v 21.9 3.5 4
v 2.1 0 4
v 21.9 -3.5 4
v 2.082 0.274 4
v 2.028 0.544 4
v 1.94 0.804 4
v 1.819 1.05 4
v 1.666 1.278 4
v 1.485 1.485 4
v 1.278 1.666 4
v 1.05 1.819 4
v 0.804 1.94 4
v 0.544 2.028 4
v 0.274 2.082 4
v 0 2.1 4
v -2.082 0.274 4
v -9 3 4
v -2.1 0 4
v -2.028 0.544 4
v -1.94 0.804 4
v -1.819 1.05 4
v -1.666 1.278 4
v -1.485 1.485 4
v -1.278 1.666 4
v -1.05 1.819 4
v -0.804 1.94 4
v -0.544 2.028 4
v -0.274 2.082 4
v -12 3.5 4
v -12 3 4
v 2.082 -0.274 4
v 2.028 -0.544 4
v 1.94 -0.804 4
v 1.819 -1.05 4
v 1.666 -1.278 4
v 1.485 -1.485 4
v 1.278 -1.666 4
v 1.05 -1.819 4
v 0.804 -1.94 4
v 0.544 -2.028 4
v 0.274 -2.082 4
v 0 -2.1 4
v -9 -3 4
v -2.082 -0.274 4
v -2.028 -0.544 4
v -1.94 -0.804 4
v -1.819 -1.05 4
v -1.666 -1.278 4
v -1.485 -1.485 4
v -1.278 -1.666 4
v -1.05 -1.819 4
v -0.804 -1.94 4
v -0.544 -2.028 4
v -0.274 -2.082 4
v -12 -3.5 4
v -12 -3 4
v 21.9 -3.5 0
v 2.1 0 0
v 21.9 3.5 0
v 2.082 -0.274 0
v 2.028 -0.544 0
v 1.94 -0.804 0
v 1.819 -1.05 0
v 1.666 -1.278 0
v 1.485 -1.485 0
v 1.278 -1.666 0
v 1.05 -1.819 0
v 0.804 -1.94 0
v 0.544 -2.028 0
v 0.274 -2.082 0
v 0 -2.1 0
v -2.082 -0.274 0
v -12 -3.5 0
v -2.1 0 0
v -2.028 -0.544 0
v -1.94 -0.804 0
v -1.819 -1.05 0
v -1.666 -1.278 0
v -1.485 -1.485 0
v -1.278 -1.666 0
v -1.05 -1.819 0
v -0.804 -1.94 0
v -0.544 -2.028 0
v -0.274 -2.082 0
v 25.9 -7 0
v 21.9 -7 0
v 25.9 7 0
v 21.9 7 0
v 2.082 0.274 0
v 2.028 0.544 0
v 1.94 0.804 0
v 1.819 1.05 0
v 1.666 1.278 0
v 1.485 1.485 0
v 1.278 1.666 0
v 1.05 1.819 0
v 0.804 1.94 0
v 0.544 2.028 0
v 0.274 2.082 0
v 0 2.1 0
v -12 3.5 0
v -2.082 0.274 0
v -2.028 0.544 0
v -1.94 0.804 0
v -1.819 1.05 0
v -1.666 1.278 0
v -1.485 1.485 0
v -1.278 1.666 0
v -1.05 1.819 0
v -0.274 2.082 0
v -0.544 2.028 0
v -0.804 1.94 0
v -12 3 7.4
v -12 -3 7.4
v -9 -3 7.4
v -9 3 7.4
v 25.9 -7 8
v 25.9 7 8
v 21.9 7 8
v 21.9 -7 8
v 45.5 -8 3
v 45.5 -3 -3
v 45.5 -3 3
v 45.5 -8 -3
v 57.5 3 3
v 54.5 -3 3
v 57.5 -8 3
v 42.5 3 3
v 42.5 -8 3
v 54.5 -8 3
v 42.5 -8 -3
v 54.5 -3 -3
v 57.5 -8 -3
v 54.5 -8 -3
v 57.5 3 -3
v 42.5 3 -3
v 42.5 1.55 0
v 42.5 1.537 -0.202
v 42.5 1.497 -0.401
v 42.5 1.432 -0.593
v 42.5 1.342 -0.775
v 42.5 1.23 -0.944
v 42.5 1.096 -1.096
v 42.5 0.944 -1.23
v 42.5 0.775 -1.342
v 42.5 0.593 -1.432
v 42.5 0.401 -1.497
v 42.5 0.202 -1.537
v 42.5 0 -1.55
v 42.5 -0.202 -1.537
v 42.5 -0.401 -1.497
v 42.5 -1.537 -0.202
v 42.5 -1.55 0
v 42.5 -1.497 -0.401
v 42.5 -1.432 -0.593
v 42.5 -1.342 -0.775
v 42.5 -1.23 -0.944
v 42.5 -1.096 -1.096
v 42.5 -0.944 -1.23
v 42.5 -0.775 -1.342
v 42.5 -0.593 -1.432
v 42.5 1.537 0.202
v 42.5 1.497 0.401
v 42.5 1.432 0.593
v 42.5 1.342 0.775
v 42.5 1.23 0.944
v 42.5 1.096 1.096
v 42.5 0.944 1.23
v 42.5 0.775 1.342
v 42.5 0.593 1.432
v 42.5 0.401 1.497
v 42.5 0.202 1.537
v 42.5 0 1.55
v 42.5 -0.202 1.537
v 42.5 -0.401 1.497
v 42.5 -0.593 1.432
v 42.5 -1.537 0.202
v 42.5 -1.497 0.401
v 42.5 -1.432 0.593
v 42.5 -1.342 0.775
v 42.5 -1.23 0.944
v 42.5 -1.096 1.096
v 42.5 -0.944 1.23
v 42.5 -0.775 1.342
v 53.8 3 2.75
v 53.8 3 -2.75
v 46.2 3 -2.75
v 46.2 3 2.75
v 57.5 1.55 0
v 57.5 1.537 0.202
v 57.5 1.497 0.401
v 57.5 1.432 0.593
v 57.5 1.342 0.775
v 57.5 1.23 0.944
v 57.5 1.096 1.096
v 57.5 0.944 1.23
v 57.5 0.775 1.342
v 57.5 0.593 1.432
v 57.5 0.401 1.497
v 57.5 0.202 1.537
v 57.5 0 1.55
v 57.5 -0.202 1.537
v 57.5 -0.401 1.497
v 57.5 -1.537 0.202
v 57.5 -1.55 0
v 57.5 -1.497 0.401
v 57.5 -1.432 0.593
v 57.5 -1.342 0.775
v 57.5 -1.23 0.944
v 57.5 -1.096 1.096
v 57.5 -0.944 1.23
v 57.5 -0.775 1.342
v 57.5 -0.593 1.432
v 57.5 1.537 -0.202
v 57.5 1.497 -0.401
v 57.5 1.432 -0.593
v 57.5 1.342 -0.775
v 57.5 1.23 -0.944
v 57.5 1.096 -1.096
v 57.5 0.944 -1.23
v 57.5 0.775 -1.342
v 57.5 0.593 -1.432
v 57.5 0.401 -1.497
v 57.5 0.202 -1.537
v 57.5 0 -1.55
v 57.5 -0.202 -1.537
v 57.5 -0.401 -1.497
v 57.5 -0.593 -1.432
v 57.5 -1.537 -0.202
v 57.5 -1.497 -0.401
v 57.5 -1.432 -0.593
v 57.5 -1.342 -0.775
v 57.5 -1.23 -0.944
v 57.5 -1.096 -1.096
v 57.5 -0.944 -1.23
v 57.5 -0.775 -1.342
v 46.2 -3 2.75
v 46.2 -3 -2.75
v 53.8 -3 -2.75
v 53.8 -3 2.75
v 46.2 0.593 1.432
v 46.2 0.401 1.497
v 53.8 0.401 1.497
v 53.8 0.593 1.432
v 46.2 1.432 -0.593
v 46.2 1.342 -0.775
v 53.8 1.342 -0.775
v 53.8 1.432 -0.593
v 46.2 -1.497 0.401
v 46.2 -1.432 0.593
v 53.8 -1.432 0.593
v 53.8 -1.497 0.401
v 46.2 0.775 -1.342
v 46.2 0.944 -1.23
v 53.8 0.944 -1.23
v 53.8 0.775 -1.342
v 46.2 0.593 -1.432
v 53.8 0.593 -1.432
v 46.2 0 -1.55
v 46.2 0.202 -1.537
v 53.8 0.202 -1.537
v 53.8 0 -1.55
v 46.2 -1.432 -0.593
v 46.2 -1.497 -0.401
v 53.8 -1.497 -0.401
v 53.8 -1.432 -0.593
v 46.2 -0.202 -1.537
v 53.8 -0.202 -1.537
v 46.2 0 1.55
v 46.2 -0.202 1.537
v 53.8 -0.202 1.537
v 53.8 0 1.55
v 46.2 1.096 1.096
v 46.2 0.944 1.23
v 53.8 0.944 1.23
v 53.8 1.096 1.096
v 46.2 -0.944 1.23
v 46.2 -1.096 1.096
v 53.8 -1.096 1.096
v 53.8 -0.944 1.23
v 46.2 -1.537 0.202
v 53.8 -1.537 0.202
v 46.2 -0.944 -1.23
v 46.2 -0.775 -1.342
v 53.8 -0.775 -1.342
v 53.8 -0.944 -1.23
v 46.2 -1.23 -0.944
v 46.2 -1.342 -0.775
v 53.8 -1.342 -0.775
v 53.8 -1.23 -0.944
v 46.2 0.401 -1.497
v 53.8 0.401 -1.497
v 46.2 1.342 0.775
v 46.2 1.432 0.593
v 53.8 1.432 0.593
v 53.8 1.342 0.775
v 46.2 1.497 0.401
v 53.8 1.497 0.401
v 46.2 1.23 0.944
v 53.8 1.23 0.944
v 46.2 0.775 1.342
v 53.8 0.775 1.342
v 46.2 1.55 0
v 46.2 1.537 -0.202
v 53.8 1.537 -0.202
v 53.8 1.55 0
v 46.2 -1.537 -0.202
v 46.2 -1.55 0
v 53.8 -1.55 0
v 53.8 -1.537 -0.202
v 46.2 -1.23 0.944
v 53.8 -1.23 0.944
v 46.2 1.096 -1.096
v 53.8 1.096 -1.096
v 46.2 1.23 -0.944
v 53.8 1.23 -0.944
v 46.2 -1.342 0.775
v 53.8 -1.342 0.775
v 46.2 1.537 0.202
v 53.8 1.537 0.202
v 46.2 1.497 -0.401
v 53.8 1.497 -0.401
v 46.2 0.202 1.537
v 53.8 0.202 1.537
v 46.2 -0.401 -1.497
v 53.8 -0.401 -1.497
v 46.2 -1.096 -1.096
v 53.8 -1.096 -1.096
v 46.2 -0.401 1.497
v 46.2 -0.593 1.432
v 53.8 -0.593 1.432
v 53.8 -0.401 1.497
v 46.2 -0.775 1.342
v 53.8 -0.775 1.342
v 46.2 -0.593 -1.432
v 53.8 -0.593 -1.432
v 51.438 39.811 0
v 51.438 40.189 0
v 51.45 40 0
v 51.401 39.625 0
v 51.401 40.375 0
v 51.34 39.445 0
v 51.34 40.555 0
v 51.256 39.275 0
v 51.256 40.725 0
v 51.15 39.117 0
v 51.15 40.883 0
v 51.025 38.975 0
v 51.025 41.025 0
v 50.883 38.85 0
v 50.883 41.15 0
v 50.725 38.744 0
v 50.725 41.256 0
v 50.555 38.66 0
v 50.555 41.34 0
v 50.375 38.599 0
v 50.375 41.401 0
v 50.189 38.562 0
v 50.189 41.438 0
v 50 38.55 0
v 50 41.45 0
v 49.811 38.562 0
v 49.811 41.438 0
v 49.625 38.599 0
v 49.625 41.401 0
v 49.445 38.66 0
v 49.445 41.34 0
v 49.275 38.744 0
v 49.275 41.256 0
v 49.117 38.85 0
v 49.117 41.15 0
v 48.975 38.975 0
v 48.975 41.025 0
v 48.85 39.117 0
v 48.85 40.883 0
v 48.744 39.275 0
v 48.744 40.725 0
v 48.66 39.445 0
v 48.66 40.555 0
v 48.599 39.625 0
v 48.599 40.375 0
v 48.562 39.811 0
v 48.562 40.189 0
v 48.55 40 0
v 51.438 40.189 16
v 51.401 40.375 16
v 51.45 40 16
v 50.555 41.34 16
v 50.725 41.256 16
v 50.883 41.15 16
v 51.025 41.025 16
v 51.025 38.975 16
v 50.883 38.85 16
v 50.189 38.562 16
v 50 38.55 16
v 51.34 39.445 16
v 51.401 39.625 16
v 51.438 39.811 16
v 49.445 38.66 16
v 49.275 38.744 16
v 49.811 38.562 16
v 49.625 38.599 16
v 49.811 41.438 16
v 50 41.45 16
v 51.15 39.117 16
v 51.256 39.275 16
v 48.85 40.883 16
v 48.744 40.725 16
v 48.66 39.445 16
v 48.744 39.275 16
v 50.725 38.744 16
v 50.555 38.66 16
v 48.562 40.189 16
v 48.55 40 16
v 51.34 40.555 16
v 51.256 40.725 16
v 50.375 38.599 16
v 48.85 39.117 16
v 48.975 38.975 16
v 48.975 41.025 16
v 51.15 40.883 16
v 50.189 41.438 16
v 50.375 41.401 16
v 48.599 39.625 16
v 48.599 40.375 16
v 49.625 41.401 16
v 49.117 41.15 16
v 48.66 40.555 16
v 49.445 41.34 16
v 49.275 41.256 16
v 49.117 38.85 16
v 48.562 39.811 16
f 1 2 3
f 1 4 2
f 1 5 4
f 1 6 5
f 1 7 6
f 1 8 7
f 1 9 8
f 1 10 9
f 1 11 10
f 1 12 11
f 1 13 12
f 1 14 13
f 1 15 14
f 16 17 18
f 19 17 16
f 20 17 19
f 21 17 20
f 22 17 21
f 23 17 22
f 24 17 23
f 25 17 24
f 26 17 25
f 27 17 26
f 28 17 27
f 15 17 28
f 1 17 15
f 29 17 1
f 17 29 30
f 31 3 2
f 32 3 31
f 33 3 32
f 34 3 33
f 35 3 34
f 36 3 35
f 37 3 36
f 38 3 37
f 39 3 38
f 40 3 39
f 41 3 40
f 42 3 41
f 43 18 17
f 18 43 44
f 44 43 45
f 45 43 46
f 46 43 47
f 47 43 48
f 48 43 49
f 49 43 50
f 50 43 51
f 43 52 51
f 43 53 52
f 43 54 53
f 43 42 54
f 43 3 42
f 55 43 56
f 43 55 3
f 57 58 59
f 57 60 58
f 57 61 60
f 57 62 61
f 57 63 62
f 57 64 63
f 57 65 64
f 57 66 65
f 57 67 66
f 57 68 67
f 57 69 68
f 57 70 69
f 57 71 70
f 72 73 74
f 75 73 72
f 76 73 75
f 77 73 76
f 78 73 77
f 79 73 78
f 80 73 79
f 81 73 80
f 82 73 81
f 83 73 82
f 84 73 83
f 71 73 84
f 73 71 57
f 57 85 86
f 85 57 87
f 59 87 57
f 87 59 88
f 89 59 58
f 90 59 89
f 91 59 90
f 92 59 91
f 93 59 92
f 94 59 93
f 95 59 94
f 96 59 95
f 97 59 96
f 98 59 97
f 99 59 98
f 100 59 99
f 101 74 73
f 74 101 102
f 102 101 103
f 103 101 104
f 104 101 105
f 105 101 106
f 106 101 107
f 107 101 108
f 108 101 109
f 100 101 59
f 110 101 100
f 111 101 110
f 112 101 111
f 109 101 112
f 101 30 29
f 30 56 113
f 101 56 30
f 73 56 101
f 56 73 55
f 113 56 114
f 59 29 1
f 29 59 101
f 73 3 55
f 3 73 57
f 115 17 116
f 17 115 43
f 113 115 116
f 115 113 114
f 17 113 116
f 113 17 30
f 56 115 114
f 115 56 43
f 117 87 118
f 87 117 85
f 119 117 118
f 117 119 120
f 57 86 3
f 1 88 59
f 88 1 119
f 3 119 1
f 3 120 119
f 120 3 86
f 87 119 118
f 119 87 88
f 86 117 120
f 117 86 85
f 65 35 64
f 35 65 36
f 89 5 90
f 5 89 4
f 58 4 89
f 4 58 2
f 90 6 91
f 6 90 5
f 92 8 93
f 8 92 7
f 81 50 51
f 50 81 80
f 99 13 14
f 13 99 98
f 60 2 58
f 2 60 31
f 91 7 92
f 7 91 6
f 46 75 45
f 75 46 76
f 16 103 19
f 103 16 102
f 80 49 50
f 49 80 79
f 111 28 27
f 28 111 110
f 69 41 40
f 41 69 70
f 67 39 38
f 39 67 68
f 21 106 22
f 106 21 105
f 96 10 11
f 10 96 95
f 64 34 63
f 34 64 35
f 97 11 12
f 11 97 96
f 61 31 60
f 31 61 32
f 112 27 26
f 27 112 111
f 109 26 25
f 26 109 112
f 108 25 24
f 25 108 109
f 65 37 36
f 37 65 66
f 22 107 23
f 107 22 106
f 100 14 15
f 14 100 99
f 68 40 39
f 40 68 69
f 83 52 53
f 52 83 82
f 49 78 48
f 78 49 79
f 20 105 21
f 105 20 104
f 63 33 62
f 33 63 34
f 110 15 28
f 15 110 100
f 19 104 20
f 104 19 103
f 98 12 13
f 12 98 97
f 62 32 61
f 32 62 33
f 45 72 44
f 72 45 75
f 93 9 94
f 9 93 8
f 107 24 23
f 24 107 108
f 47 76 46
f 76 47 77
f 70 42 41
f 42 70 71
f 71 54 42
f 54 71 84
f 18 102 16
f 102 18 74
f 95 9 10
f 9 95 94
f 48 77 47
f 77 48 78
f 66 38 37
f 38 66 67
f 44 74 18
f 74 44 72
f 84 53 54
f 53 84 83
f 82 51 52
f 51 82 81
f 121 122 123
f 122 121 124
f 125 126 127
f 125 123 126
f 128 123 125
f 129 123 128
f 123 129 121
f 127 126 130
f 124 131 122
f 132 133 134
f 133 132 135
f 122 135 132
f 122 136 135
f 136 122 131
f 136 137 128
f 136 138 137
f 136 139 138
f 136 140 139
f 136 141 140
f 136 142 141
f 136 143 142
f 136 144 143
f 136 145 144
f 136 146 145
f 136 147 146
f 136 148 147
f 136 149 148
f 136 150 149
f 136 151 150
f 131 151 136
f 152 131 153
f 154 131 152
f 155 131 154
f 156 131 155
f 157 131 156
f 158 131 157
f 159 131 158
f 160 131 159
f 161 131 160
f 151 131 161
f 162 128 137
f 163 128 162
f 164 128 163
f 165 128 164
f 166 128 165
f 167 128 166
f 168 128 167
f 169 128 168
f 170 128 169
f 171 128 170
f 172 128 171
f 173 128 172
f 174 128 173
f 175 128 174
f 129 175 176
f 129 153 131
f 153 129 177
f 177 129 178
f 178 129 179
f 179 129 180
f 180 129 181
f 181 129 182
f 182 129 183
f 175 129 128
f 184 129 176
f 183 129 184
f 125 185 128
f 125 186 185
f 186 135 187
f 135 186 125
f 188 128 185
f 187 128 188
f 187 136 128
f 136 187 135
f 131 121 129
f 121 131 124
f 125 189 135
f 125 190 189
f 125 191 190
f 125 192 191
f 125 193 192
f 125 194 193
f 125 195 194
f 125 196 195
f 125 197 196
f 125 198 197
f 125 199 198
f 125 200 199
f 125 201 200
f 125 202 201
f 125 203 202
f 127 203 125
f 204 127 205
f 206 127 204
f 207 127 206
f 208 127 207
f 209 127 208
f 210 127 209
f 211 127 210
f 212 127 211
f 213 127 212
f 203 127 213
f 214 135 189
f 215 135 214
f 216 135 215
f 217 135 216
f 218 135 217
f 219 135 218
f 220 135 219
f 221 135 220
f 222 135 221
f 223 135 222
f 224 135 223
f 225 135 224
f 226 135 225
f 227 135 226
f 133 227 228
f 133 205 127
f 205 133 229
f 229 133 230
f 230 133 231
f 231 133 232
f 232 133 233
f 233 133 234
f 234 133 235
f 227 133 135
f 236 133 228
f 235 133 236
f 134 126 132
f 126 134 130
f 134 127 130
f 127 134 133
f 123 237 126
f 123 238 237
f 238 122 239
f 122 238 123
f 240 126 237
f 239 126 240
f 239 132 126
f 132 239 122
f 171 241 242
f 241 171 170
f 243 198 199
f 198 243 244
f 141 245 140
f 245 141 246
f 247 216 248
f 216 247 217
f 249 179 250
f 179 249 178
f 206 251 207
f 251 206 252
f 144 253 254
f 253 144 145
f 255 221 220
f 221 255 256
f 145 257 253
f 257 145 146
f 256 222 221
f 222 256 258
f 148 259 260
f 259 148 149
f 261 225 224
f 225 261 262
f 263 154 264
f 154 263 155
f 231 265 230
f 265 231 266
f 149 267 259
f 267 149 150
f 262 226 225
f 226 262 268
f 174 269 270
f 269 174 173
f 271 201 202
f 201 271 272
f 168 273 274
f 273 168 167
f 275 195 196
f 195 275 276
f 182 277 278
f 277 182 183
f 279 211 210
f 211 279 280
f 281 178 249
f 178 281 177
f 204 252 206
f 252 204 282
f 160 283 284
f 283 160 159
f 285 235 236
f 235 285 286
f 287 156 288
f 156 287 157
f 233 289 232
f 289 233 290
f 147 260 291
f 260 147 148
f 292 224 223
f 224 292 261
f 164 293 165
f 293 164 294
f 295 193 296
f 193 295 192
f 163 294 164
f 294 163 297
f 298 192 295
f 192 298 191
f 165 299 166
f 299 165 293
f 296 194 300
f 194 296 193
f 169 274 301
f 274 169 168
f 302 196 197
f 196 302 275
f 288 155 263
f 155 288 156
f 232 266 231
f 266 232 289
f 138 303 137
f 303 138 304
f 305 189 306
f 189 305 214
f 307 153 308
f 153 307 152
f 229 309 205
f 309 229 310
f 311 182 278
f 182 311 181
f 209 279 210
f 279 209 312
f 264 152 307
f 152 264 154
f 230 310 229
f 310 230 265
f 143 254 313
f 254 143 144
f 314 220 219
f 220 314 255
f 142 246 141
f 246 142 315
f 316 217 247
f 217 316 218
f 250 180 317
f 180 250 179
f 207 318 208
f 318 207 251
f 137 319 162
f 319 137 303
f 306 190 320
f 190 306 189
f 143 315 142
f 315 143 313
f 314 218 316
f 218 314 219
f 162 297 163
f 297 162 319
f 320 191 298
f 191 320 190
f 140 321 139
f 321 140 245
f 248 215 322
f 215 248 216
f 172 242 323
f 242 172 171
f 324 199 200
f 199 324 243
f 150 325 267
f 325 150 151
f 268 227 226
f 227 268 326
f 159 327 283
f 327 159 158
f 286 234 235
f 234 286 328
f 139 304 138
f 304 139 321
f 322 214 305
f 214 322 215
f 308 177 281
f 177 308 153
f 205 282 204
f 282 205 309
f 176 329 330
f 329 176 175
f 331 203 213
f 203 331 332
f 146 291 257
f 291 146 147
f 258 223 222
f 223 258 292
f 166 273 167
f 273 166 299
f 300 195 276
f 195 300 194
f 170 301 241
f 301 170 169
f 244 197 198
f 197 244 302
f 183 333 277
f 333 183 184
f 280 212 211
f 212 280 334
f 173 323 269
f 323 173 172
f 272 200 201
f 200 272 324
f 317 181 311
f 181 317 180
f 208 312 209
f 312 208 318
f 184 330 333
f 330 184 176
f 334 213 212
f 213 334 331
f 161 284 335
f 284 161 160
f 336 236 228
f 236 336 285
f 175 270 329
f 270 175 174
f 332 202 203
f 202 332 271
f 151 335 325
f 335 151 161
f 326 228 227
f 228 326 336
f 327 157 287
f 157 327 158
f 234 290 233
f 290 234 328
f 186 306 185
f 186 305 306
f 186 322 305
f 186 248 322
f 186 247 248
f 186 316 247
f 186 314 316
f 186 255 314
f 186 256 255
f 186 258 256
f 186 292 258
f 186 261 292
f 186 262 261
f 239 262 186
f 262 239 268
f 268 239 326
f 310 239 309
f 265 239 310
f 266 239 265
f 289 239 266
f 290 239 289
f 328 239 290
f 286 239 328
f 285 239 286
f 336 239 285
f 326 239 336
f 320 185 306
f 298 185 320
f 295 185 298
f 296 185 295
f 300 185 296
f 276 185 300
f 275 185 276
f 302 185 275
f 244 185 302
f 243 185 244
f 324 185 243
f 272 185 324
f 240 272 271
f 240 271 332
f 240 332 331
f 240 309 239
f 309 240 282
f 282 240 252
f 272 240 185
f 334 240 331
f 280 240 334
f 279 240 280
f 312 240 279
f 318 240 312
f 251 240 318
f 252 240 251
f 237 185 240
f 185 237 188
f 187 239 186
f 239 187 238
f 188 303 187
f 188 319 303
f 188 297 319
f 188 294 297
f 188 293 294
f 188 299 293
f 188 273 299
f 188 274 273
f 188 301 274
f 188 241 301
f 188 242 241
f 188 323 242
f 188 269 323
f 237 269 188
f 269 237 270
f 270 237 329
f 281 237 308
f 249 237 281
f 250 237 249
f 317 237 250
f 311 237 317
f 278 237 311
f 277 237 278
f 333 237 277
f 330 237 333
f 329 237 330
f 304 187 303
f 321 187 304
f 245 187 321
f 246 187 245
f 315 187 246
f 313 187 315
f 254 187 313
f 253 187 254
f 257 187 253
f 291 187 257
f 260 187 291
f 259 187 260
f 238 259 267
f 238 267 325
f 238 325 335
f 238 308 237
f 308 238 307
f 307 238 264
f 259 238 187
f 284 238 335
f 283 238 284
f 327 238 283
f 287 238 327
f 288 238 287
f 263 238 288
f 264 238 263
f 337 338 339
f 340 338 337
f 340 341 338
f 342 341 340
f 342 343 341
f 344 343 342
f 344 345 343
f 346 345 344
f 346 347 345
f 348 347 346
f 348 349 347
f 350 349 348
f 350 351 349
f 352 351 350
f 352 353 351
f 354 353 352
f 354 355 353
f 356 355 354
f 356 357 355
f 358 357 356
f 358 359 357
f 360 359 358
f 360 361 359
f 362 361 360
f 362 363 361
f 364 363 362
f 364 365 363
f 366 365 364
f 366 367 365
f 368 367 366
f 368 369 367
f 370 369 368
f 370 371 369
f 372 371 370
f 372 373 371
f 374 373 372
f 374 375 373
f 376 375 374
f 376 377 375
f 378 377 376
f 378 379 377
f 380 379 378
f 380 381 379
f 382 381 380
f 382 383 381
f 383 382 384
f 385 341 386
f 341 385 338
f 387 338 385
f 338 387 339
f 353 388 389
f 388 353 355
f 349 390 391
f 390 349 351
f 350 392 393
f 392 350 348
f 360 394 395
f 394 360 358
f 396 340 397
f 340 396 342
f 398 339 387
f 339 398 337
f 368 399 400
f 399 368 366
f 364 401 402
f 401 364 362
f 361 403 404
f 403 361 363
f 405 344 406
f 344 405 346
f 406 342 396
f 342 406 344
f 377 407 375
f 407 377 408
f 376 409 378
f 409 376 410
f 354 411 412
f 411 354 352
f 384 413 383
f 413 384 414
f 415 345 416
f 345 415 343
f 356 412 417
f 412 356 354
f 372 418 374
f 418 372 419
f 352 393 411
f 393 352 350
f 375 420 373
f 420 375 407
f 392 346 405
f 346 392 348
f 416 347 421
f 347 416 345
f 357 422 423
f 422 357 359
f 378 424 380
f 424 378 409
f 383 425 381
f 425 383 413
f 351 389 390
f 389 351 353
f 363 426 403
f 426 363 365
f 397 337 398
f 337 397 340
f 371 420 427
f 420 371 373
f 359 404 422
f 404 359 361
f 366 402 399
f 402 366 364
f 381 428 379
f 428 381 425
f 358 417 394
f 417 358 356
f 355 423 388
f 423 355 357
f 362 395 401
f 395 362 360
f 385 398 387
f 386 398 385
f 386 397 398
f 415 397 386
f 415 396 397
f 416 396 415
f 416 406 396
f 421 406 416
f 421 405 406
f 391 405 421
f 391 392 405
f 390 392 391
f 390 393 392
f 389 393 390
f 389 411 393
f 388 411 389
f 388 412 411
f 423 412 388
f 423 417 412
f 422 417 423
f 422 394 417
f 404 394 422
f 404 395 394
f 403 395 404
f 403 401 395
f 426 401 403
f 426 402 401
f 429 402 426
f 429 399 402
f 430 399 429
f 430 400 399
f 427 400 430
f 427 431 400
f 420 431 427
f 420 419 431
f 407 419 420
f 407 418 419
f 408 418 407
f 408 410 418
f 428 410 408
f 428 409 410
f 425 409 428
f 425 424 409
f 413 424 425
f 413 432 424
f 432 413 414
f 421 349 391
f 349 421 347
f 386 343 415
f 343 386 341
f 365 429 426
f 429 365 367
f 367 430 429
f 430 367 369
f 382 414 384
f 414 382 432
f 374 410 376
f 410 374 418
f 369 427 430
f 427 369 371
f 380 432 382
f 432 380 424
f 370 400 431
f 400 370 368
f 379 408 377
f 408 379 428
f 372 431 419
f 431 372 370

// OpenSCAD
// ═══════════════════════════════════════════════════════════════════════
//  CowPad — Manual Trigger Lever  ·  V2 Demo Component
//  ENGN676  ·  Lincoln University  ·  2026
//
//  For DEMO USE: press button end to release platform latch.
//  For V2 PRODUCTION: replace lever with solenoid pin.
//    Solenoid pin engages same latch notch — no tile modification needed.
//    Arduino GPIO → MOSFET → 12V solenoid → cartridge ejected.
//
//  HOW TRIGGER WORKS:
//    Lever pivots on a pin through the tile outer wall.
//    Hook end engages latch notch on platform underside.
//    Press button → lever rotates → hook lifts out of notch → platform fires.
//    Release button → torsion spring returns hook to catch position.
//
//  ► PRINT 1 COPY
//  ► Orientation : flat side DOWN
//  ► Layer height : 0.2mm  ·  Infill 30%  ·  No supports
//  ► Material     : PLA
//  ► Est. time    : ~20 min
//
//  ALSO PRINT: 1× PivotPin (last module in this file)
// ═══════════════════════════════════════════════════════════════════════

$fn = 48;

// ── Tile parameters ───────────────────────────────────────────────────
OR = 145;
ANG = 45;
BASE_H = 6;
CAV_WALL = 5;

// ── Lever geometry ────────────────────────────────────────────────────
LEVER_T    = 4;     // lever arm thickness
LEVER_W    = 7;     // lever arm width
HOOK_L     = 12;    // hook arm length (toward platform latch)
BTN_L      = 22;    // button arm length (user presses this)
PIVOT_D    = 4.2;   // pivot hole diameter (3mm wire + 0.6 clearance)

// Hook tip (catches platform latch notch)
HOOK_TIP_W = 6;
HOOK_TIP_H = 3.5;
HOOK_TIP_D = 3;

// Button cap (larger face for easy press)
BTN_W = 14;
BTN_H = 8;

// ── Pivot placement ───────────────────────────────────────────────────
// Lever mounts on outer face of tile at mid-arc
PIVOT_ANG = ANG / 2;   // 22.5° — midpoint of tile arc
PIVOT_R   = OR + 3;    // just outside tile outer wall

// ═══════════════════════════════════════════════════════════════════════
// LEVER BODY
// An L-shaped lever arm with pivot hole in the middle.
// Hook arm goes INWARD (toward platform); button arm goes OUTWARD/UPWARD.
// ═══════════════════════════════════════════════════════════════════════

module lever_body() {
  difference() {
    union() {
      // Hook arm (short, toward latch notch)
      translate([-HOOK_L, -LEVER_W/2, 0])
        cube([HOOK_L, LEVER_W, LEVER_T]);

      // Button arm (long, toward operator)
      translate([0, -LEVER_W/2, 0])
        cube([BTN_L, LEVER_W, LEVER_T]);

      // Hook tip (engages latch notch)
      translate([-HOOK_L, -HOOK_TIP_W/2, LEVER_T - 0.1])
        cube([HOOK_TIP_D, HOOK_TIP_W, HOOK_TIP_H]);

      // Button cap (enlarged press face)
      translate([BTN_L - 0.1, -BTN_W/2, 0])
        cube([LEVER_T, BTN_W, BTN_H]);
    }

    // Pivot hole (centred at origin of this module)
    translate([0, 0, -0.1])
      cylinder(d=PIVOT_D, h=LEVER_T+0.2);
  }
}

// ═══════════════════════════════════════════════════════════════════════
// PIVOT MOUNT BRACKET
// Clips to the tile outer face. Provides pivot pin housing.
// Press-fit onto tile outer rim (OR edge).
// ═══════════════════════════════════════════════════════════════════════

BRKT_W     = LEVER_W + 8;
BRKT_H     = BASE_H;
BRKT_DEPTH = 6;
PIN_D      = 3.1;   // pivot pin diameter (3mm nail or wire)

module pivot_bracket() {
  difference() {
    union() {
      // Main bracket body
      cube([BRKT_W, BRKT_DEPTH, BRKT_H], center=true);

      // Side walls that wrap over tile outer edge (C-clip)
      for(s=[-1,1])
        translate([s*(BRKT_W/2 - 1.5), -CAV_WALL/2, 0])
          cube([3, BRKT_DEPTH + CAV_WALL, BRKT_H], center=true);
    }

    // Pivot pin channel (horizontal, through bracket walls)
    rotate([0,90,0])
      translate([0, 0, -BRKT_W/2 - 0.1])
        cylinder(d=PIN_D, h=BRKT_W + 0.2);

    // Lever clearance slot (lever swings through bracket body)
    cube([LEVER_W + 0.6, BRKT_DEPTH + 0.2, LEVER_T + 1.5], center=true);
  }
}

// ═══════════════════════════════════════════════════════════════════════
// PIVOT PIN (print this separately — acts as hinge axle)
// 3mm dia × BRKT_W long. Or use a real 3mm nail instead.
// ═══════════════════════════════════════════════════════════════════════

module pivot_pin() {
  translate([0, 40, 0])  // offset so it prints next to bracket
    cylinder(d=2.9, h=BRKT_W + 1);
}

// ═══════════════════════════════════════════════════════════════════════
// RENDER
// Print lever and bracket together (spaced apart on build plate)
// ═══════════════════════════════════════════════════════════════════════

lever_body();

translate([50, 0, 0])
  pivot_bracket();

translate([50, 0, 0])
  pivot_pin();
